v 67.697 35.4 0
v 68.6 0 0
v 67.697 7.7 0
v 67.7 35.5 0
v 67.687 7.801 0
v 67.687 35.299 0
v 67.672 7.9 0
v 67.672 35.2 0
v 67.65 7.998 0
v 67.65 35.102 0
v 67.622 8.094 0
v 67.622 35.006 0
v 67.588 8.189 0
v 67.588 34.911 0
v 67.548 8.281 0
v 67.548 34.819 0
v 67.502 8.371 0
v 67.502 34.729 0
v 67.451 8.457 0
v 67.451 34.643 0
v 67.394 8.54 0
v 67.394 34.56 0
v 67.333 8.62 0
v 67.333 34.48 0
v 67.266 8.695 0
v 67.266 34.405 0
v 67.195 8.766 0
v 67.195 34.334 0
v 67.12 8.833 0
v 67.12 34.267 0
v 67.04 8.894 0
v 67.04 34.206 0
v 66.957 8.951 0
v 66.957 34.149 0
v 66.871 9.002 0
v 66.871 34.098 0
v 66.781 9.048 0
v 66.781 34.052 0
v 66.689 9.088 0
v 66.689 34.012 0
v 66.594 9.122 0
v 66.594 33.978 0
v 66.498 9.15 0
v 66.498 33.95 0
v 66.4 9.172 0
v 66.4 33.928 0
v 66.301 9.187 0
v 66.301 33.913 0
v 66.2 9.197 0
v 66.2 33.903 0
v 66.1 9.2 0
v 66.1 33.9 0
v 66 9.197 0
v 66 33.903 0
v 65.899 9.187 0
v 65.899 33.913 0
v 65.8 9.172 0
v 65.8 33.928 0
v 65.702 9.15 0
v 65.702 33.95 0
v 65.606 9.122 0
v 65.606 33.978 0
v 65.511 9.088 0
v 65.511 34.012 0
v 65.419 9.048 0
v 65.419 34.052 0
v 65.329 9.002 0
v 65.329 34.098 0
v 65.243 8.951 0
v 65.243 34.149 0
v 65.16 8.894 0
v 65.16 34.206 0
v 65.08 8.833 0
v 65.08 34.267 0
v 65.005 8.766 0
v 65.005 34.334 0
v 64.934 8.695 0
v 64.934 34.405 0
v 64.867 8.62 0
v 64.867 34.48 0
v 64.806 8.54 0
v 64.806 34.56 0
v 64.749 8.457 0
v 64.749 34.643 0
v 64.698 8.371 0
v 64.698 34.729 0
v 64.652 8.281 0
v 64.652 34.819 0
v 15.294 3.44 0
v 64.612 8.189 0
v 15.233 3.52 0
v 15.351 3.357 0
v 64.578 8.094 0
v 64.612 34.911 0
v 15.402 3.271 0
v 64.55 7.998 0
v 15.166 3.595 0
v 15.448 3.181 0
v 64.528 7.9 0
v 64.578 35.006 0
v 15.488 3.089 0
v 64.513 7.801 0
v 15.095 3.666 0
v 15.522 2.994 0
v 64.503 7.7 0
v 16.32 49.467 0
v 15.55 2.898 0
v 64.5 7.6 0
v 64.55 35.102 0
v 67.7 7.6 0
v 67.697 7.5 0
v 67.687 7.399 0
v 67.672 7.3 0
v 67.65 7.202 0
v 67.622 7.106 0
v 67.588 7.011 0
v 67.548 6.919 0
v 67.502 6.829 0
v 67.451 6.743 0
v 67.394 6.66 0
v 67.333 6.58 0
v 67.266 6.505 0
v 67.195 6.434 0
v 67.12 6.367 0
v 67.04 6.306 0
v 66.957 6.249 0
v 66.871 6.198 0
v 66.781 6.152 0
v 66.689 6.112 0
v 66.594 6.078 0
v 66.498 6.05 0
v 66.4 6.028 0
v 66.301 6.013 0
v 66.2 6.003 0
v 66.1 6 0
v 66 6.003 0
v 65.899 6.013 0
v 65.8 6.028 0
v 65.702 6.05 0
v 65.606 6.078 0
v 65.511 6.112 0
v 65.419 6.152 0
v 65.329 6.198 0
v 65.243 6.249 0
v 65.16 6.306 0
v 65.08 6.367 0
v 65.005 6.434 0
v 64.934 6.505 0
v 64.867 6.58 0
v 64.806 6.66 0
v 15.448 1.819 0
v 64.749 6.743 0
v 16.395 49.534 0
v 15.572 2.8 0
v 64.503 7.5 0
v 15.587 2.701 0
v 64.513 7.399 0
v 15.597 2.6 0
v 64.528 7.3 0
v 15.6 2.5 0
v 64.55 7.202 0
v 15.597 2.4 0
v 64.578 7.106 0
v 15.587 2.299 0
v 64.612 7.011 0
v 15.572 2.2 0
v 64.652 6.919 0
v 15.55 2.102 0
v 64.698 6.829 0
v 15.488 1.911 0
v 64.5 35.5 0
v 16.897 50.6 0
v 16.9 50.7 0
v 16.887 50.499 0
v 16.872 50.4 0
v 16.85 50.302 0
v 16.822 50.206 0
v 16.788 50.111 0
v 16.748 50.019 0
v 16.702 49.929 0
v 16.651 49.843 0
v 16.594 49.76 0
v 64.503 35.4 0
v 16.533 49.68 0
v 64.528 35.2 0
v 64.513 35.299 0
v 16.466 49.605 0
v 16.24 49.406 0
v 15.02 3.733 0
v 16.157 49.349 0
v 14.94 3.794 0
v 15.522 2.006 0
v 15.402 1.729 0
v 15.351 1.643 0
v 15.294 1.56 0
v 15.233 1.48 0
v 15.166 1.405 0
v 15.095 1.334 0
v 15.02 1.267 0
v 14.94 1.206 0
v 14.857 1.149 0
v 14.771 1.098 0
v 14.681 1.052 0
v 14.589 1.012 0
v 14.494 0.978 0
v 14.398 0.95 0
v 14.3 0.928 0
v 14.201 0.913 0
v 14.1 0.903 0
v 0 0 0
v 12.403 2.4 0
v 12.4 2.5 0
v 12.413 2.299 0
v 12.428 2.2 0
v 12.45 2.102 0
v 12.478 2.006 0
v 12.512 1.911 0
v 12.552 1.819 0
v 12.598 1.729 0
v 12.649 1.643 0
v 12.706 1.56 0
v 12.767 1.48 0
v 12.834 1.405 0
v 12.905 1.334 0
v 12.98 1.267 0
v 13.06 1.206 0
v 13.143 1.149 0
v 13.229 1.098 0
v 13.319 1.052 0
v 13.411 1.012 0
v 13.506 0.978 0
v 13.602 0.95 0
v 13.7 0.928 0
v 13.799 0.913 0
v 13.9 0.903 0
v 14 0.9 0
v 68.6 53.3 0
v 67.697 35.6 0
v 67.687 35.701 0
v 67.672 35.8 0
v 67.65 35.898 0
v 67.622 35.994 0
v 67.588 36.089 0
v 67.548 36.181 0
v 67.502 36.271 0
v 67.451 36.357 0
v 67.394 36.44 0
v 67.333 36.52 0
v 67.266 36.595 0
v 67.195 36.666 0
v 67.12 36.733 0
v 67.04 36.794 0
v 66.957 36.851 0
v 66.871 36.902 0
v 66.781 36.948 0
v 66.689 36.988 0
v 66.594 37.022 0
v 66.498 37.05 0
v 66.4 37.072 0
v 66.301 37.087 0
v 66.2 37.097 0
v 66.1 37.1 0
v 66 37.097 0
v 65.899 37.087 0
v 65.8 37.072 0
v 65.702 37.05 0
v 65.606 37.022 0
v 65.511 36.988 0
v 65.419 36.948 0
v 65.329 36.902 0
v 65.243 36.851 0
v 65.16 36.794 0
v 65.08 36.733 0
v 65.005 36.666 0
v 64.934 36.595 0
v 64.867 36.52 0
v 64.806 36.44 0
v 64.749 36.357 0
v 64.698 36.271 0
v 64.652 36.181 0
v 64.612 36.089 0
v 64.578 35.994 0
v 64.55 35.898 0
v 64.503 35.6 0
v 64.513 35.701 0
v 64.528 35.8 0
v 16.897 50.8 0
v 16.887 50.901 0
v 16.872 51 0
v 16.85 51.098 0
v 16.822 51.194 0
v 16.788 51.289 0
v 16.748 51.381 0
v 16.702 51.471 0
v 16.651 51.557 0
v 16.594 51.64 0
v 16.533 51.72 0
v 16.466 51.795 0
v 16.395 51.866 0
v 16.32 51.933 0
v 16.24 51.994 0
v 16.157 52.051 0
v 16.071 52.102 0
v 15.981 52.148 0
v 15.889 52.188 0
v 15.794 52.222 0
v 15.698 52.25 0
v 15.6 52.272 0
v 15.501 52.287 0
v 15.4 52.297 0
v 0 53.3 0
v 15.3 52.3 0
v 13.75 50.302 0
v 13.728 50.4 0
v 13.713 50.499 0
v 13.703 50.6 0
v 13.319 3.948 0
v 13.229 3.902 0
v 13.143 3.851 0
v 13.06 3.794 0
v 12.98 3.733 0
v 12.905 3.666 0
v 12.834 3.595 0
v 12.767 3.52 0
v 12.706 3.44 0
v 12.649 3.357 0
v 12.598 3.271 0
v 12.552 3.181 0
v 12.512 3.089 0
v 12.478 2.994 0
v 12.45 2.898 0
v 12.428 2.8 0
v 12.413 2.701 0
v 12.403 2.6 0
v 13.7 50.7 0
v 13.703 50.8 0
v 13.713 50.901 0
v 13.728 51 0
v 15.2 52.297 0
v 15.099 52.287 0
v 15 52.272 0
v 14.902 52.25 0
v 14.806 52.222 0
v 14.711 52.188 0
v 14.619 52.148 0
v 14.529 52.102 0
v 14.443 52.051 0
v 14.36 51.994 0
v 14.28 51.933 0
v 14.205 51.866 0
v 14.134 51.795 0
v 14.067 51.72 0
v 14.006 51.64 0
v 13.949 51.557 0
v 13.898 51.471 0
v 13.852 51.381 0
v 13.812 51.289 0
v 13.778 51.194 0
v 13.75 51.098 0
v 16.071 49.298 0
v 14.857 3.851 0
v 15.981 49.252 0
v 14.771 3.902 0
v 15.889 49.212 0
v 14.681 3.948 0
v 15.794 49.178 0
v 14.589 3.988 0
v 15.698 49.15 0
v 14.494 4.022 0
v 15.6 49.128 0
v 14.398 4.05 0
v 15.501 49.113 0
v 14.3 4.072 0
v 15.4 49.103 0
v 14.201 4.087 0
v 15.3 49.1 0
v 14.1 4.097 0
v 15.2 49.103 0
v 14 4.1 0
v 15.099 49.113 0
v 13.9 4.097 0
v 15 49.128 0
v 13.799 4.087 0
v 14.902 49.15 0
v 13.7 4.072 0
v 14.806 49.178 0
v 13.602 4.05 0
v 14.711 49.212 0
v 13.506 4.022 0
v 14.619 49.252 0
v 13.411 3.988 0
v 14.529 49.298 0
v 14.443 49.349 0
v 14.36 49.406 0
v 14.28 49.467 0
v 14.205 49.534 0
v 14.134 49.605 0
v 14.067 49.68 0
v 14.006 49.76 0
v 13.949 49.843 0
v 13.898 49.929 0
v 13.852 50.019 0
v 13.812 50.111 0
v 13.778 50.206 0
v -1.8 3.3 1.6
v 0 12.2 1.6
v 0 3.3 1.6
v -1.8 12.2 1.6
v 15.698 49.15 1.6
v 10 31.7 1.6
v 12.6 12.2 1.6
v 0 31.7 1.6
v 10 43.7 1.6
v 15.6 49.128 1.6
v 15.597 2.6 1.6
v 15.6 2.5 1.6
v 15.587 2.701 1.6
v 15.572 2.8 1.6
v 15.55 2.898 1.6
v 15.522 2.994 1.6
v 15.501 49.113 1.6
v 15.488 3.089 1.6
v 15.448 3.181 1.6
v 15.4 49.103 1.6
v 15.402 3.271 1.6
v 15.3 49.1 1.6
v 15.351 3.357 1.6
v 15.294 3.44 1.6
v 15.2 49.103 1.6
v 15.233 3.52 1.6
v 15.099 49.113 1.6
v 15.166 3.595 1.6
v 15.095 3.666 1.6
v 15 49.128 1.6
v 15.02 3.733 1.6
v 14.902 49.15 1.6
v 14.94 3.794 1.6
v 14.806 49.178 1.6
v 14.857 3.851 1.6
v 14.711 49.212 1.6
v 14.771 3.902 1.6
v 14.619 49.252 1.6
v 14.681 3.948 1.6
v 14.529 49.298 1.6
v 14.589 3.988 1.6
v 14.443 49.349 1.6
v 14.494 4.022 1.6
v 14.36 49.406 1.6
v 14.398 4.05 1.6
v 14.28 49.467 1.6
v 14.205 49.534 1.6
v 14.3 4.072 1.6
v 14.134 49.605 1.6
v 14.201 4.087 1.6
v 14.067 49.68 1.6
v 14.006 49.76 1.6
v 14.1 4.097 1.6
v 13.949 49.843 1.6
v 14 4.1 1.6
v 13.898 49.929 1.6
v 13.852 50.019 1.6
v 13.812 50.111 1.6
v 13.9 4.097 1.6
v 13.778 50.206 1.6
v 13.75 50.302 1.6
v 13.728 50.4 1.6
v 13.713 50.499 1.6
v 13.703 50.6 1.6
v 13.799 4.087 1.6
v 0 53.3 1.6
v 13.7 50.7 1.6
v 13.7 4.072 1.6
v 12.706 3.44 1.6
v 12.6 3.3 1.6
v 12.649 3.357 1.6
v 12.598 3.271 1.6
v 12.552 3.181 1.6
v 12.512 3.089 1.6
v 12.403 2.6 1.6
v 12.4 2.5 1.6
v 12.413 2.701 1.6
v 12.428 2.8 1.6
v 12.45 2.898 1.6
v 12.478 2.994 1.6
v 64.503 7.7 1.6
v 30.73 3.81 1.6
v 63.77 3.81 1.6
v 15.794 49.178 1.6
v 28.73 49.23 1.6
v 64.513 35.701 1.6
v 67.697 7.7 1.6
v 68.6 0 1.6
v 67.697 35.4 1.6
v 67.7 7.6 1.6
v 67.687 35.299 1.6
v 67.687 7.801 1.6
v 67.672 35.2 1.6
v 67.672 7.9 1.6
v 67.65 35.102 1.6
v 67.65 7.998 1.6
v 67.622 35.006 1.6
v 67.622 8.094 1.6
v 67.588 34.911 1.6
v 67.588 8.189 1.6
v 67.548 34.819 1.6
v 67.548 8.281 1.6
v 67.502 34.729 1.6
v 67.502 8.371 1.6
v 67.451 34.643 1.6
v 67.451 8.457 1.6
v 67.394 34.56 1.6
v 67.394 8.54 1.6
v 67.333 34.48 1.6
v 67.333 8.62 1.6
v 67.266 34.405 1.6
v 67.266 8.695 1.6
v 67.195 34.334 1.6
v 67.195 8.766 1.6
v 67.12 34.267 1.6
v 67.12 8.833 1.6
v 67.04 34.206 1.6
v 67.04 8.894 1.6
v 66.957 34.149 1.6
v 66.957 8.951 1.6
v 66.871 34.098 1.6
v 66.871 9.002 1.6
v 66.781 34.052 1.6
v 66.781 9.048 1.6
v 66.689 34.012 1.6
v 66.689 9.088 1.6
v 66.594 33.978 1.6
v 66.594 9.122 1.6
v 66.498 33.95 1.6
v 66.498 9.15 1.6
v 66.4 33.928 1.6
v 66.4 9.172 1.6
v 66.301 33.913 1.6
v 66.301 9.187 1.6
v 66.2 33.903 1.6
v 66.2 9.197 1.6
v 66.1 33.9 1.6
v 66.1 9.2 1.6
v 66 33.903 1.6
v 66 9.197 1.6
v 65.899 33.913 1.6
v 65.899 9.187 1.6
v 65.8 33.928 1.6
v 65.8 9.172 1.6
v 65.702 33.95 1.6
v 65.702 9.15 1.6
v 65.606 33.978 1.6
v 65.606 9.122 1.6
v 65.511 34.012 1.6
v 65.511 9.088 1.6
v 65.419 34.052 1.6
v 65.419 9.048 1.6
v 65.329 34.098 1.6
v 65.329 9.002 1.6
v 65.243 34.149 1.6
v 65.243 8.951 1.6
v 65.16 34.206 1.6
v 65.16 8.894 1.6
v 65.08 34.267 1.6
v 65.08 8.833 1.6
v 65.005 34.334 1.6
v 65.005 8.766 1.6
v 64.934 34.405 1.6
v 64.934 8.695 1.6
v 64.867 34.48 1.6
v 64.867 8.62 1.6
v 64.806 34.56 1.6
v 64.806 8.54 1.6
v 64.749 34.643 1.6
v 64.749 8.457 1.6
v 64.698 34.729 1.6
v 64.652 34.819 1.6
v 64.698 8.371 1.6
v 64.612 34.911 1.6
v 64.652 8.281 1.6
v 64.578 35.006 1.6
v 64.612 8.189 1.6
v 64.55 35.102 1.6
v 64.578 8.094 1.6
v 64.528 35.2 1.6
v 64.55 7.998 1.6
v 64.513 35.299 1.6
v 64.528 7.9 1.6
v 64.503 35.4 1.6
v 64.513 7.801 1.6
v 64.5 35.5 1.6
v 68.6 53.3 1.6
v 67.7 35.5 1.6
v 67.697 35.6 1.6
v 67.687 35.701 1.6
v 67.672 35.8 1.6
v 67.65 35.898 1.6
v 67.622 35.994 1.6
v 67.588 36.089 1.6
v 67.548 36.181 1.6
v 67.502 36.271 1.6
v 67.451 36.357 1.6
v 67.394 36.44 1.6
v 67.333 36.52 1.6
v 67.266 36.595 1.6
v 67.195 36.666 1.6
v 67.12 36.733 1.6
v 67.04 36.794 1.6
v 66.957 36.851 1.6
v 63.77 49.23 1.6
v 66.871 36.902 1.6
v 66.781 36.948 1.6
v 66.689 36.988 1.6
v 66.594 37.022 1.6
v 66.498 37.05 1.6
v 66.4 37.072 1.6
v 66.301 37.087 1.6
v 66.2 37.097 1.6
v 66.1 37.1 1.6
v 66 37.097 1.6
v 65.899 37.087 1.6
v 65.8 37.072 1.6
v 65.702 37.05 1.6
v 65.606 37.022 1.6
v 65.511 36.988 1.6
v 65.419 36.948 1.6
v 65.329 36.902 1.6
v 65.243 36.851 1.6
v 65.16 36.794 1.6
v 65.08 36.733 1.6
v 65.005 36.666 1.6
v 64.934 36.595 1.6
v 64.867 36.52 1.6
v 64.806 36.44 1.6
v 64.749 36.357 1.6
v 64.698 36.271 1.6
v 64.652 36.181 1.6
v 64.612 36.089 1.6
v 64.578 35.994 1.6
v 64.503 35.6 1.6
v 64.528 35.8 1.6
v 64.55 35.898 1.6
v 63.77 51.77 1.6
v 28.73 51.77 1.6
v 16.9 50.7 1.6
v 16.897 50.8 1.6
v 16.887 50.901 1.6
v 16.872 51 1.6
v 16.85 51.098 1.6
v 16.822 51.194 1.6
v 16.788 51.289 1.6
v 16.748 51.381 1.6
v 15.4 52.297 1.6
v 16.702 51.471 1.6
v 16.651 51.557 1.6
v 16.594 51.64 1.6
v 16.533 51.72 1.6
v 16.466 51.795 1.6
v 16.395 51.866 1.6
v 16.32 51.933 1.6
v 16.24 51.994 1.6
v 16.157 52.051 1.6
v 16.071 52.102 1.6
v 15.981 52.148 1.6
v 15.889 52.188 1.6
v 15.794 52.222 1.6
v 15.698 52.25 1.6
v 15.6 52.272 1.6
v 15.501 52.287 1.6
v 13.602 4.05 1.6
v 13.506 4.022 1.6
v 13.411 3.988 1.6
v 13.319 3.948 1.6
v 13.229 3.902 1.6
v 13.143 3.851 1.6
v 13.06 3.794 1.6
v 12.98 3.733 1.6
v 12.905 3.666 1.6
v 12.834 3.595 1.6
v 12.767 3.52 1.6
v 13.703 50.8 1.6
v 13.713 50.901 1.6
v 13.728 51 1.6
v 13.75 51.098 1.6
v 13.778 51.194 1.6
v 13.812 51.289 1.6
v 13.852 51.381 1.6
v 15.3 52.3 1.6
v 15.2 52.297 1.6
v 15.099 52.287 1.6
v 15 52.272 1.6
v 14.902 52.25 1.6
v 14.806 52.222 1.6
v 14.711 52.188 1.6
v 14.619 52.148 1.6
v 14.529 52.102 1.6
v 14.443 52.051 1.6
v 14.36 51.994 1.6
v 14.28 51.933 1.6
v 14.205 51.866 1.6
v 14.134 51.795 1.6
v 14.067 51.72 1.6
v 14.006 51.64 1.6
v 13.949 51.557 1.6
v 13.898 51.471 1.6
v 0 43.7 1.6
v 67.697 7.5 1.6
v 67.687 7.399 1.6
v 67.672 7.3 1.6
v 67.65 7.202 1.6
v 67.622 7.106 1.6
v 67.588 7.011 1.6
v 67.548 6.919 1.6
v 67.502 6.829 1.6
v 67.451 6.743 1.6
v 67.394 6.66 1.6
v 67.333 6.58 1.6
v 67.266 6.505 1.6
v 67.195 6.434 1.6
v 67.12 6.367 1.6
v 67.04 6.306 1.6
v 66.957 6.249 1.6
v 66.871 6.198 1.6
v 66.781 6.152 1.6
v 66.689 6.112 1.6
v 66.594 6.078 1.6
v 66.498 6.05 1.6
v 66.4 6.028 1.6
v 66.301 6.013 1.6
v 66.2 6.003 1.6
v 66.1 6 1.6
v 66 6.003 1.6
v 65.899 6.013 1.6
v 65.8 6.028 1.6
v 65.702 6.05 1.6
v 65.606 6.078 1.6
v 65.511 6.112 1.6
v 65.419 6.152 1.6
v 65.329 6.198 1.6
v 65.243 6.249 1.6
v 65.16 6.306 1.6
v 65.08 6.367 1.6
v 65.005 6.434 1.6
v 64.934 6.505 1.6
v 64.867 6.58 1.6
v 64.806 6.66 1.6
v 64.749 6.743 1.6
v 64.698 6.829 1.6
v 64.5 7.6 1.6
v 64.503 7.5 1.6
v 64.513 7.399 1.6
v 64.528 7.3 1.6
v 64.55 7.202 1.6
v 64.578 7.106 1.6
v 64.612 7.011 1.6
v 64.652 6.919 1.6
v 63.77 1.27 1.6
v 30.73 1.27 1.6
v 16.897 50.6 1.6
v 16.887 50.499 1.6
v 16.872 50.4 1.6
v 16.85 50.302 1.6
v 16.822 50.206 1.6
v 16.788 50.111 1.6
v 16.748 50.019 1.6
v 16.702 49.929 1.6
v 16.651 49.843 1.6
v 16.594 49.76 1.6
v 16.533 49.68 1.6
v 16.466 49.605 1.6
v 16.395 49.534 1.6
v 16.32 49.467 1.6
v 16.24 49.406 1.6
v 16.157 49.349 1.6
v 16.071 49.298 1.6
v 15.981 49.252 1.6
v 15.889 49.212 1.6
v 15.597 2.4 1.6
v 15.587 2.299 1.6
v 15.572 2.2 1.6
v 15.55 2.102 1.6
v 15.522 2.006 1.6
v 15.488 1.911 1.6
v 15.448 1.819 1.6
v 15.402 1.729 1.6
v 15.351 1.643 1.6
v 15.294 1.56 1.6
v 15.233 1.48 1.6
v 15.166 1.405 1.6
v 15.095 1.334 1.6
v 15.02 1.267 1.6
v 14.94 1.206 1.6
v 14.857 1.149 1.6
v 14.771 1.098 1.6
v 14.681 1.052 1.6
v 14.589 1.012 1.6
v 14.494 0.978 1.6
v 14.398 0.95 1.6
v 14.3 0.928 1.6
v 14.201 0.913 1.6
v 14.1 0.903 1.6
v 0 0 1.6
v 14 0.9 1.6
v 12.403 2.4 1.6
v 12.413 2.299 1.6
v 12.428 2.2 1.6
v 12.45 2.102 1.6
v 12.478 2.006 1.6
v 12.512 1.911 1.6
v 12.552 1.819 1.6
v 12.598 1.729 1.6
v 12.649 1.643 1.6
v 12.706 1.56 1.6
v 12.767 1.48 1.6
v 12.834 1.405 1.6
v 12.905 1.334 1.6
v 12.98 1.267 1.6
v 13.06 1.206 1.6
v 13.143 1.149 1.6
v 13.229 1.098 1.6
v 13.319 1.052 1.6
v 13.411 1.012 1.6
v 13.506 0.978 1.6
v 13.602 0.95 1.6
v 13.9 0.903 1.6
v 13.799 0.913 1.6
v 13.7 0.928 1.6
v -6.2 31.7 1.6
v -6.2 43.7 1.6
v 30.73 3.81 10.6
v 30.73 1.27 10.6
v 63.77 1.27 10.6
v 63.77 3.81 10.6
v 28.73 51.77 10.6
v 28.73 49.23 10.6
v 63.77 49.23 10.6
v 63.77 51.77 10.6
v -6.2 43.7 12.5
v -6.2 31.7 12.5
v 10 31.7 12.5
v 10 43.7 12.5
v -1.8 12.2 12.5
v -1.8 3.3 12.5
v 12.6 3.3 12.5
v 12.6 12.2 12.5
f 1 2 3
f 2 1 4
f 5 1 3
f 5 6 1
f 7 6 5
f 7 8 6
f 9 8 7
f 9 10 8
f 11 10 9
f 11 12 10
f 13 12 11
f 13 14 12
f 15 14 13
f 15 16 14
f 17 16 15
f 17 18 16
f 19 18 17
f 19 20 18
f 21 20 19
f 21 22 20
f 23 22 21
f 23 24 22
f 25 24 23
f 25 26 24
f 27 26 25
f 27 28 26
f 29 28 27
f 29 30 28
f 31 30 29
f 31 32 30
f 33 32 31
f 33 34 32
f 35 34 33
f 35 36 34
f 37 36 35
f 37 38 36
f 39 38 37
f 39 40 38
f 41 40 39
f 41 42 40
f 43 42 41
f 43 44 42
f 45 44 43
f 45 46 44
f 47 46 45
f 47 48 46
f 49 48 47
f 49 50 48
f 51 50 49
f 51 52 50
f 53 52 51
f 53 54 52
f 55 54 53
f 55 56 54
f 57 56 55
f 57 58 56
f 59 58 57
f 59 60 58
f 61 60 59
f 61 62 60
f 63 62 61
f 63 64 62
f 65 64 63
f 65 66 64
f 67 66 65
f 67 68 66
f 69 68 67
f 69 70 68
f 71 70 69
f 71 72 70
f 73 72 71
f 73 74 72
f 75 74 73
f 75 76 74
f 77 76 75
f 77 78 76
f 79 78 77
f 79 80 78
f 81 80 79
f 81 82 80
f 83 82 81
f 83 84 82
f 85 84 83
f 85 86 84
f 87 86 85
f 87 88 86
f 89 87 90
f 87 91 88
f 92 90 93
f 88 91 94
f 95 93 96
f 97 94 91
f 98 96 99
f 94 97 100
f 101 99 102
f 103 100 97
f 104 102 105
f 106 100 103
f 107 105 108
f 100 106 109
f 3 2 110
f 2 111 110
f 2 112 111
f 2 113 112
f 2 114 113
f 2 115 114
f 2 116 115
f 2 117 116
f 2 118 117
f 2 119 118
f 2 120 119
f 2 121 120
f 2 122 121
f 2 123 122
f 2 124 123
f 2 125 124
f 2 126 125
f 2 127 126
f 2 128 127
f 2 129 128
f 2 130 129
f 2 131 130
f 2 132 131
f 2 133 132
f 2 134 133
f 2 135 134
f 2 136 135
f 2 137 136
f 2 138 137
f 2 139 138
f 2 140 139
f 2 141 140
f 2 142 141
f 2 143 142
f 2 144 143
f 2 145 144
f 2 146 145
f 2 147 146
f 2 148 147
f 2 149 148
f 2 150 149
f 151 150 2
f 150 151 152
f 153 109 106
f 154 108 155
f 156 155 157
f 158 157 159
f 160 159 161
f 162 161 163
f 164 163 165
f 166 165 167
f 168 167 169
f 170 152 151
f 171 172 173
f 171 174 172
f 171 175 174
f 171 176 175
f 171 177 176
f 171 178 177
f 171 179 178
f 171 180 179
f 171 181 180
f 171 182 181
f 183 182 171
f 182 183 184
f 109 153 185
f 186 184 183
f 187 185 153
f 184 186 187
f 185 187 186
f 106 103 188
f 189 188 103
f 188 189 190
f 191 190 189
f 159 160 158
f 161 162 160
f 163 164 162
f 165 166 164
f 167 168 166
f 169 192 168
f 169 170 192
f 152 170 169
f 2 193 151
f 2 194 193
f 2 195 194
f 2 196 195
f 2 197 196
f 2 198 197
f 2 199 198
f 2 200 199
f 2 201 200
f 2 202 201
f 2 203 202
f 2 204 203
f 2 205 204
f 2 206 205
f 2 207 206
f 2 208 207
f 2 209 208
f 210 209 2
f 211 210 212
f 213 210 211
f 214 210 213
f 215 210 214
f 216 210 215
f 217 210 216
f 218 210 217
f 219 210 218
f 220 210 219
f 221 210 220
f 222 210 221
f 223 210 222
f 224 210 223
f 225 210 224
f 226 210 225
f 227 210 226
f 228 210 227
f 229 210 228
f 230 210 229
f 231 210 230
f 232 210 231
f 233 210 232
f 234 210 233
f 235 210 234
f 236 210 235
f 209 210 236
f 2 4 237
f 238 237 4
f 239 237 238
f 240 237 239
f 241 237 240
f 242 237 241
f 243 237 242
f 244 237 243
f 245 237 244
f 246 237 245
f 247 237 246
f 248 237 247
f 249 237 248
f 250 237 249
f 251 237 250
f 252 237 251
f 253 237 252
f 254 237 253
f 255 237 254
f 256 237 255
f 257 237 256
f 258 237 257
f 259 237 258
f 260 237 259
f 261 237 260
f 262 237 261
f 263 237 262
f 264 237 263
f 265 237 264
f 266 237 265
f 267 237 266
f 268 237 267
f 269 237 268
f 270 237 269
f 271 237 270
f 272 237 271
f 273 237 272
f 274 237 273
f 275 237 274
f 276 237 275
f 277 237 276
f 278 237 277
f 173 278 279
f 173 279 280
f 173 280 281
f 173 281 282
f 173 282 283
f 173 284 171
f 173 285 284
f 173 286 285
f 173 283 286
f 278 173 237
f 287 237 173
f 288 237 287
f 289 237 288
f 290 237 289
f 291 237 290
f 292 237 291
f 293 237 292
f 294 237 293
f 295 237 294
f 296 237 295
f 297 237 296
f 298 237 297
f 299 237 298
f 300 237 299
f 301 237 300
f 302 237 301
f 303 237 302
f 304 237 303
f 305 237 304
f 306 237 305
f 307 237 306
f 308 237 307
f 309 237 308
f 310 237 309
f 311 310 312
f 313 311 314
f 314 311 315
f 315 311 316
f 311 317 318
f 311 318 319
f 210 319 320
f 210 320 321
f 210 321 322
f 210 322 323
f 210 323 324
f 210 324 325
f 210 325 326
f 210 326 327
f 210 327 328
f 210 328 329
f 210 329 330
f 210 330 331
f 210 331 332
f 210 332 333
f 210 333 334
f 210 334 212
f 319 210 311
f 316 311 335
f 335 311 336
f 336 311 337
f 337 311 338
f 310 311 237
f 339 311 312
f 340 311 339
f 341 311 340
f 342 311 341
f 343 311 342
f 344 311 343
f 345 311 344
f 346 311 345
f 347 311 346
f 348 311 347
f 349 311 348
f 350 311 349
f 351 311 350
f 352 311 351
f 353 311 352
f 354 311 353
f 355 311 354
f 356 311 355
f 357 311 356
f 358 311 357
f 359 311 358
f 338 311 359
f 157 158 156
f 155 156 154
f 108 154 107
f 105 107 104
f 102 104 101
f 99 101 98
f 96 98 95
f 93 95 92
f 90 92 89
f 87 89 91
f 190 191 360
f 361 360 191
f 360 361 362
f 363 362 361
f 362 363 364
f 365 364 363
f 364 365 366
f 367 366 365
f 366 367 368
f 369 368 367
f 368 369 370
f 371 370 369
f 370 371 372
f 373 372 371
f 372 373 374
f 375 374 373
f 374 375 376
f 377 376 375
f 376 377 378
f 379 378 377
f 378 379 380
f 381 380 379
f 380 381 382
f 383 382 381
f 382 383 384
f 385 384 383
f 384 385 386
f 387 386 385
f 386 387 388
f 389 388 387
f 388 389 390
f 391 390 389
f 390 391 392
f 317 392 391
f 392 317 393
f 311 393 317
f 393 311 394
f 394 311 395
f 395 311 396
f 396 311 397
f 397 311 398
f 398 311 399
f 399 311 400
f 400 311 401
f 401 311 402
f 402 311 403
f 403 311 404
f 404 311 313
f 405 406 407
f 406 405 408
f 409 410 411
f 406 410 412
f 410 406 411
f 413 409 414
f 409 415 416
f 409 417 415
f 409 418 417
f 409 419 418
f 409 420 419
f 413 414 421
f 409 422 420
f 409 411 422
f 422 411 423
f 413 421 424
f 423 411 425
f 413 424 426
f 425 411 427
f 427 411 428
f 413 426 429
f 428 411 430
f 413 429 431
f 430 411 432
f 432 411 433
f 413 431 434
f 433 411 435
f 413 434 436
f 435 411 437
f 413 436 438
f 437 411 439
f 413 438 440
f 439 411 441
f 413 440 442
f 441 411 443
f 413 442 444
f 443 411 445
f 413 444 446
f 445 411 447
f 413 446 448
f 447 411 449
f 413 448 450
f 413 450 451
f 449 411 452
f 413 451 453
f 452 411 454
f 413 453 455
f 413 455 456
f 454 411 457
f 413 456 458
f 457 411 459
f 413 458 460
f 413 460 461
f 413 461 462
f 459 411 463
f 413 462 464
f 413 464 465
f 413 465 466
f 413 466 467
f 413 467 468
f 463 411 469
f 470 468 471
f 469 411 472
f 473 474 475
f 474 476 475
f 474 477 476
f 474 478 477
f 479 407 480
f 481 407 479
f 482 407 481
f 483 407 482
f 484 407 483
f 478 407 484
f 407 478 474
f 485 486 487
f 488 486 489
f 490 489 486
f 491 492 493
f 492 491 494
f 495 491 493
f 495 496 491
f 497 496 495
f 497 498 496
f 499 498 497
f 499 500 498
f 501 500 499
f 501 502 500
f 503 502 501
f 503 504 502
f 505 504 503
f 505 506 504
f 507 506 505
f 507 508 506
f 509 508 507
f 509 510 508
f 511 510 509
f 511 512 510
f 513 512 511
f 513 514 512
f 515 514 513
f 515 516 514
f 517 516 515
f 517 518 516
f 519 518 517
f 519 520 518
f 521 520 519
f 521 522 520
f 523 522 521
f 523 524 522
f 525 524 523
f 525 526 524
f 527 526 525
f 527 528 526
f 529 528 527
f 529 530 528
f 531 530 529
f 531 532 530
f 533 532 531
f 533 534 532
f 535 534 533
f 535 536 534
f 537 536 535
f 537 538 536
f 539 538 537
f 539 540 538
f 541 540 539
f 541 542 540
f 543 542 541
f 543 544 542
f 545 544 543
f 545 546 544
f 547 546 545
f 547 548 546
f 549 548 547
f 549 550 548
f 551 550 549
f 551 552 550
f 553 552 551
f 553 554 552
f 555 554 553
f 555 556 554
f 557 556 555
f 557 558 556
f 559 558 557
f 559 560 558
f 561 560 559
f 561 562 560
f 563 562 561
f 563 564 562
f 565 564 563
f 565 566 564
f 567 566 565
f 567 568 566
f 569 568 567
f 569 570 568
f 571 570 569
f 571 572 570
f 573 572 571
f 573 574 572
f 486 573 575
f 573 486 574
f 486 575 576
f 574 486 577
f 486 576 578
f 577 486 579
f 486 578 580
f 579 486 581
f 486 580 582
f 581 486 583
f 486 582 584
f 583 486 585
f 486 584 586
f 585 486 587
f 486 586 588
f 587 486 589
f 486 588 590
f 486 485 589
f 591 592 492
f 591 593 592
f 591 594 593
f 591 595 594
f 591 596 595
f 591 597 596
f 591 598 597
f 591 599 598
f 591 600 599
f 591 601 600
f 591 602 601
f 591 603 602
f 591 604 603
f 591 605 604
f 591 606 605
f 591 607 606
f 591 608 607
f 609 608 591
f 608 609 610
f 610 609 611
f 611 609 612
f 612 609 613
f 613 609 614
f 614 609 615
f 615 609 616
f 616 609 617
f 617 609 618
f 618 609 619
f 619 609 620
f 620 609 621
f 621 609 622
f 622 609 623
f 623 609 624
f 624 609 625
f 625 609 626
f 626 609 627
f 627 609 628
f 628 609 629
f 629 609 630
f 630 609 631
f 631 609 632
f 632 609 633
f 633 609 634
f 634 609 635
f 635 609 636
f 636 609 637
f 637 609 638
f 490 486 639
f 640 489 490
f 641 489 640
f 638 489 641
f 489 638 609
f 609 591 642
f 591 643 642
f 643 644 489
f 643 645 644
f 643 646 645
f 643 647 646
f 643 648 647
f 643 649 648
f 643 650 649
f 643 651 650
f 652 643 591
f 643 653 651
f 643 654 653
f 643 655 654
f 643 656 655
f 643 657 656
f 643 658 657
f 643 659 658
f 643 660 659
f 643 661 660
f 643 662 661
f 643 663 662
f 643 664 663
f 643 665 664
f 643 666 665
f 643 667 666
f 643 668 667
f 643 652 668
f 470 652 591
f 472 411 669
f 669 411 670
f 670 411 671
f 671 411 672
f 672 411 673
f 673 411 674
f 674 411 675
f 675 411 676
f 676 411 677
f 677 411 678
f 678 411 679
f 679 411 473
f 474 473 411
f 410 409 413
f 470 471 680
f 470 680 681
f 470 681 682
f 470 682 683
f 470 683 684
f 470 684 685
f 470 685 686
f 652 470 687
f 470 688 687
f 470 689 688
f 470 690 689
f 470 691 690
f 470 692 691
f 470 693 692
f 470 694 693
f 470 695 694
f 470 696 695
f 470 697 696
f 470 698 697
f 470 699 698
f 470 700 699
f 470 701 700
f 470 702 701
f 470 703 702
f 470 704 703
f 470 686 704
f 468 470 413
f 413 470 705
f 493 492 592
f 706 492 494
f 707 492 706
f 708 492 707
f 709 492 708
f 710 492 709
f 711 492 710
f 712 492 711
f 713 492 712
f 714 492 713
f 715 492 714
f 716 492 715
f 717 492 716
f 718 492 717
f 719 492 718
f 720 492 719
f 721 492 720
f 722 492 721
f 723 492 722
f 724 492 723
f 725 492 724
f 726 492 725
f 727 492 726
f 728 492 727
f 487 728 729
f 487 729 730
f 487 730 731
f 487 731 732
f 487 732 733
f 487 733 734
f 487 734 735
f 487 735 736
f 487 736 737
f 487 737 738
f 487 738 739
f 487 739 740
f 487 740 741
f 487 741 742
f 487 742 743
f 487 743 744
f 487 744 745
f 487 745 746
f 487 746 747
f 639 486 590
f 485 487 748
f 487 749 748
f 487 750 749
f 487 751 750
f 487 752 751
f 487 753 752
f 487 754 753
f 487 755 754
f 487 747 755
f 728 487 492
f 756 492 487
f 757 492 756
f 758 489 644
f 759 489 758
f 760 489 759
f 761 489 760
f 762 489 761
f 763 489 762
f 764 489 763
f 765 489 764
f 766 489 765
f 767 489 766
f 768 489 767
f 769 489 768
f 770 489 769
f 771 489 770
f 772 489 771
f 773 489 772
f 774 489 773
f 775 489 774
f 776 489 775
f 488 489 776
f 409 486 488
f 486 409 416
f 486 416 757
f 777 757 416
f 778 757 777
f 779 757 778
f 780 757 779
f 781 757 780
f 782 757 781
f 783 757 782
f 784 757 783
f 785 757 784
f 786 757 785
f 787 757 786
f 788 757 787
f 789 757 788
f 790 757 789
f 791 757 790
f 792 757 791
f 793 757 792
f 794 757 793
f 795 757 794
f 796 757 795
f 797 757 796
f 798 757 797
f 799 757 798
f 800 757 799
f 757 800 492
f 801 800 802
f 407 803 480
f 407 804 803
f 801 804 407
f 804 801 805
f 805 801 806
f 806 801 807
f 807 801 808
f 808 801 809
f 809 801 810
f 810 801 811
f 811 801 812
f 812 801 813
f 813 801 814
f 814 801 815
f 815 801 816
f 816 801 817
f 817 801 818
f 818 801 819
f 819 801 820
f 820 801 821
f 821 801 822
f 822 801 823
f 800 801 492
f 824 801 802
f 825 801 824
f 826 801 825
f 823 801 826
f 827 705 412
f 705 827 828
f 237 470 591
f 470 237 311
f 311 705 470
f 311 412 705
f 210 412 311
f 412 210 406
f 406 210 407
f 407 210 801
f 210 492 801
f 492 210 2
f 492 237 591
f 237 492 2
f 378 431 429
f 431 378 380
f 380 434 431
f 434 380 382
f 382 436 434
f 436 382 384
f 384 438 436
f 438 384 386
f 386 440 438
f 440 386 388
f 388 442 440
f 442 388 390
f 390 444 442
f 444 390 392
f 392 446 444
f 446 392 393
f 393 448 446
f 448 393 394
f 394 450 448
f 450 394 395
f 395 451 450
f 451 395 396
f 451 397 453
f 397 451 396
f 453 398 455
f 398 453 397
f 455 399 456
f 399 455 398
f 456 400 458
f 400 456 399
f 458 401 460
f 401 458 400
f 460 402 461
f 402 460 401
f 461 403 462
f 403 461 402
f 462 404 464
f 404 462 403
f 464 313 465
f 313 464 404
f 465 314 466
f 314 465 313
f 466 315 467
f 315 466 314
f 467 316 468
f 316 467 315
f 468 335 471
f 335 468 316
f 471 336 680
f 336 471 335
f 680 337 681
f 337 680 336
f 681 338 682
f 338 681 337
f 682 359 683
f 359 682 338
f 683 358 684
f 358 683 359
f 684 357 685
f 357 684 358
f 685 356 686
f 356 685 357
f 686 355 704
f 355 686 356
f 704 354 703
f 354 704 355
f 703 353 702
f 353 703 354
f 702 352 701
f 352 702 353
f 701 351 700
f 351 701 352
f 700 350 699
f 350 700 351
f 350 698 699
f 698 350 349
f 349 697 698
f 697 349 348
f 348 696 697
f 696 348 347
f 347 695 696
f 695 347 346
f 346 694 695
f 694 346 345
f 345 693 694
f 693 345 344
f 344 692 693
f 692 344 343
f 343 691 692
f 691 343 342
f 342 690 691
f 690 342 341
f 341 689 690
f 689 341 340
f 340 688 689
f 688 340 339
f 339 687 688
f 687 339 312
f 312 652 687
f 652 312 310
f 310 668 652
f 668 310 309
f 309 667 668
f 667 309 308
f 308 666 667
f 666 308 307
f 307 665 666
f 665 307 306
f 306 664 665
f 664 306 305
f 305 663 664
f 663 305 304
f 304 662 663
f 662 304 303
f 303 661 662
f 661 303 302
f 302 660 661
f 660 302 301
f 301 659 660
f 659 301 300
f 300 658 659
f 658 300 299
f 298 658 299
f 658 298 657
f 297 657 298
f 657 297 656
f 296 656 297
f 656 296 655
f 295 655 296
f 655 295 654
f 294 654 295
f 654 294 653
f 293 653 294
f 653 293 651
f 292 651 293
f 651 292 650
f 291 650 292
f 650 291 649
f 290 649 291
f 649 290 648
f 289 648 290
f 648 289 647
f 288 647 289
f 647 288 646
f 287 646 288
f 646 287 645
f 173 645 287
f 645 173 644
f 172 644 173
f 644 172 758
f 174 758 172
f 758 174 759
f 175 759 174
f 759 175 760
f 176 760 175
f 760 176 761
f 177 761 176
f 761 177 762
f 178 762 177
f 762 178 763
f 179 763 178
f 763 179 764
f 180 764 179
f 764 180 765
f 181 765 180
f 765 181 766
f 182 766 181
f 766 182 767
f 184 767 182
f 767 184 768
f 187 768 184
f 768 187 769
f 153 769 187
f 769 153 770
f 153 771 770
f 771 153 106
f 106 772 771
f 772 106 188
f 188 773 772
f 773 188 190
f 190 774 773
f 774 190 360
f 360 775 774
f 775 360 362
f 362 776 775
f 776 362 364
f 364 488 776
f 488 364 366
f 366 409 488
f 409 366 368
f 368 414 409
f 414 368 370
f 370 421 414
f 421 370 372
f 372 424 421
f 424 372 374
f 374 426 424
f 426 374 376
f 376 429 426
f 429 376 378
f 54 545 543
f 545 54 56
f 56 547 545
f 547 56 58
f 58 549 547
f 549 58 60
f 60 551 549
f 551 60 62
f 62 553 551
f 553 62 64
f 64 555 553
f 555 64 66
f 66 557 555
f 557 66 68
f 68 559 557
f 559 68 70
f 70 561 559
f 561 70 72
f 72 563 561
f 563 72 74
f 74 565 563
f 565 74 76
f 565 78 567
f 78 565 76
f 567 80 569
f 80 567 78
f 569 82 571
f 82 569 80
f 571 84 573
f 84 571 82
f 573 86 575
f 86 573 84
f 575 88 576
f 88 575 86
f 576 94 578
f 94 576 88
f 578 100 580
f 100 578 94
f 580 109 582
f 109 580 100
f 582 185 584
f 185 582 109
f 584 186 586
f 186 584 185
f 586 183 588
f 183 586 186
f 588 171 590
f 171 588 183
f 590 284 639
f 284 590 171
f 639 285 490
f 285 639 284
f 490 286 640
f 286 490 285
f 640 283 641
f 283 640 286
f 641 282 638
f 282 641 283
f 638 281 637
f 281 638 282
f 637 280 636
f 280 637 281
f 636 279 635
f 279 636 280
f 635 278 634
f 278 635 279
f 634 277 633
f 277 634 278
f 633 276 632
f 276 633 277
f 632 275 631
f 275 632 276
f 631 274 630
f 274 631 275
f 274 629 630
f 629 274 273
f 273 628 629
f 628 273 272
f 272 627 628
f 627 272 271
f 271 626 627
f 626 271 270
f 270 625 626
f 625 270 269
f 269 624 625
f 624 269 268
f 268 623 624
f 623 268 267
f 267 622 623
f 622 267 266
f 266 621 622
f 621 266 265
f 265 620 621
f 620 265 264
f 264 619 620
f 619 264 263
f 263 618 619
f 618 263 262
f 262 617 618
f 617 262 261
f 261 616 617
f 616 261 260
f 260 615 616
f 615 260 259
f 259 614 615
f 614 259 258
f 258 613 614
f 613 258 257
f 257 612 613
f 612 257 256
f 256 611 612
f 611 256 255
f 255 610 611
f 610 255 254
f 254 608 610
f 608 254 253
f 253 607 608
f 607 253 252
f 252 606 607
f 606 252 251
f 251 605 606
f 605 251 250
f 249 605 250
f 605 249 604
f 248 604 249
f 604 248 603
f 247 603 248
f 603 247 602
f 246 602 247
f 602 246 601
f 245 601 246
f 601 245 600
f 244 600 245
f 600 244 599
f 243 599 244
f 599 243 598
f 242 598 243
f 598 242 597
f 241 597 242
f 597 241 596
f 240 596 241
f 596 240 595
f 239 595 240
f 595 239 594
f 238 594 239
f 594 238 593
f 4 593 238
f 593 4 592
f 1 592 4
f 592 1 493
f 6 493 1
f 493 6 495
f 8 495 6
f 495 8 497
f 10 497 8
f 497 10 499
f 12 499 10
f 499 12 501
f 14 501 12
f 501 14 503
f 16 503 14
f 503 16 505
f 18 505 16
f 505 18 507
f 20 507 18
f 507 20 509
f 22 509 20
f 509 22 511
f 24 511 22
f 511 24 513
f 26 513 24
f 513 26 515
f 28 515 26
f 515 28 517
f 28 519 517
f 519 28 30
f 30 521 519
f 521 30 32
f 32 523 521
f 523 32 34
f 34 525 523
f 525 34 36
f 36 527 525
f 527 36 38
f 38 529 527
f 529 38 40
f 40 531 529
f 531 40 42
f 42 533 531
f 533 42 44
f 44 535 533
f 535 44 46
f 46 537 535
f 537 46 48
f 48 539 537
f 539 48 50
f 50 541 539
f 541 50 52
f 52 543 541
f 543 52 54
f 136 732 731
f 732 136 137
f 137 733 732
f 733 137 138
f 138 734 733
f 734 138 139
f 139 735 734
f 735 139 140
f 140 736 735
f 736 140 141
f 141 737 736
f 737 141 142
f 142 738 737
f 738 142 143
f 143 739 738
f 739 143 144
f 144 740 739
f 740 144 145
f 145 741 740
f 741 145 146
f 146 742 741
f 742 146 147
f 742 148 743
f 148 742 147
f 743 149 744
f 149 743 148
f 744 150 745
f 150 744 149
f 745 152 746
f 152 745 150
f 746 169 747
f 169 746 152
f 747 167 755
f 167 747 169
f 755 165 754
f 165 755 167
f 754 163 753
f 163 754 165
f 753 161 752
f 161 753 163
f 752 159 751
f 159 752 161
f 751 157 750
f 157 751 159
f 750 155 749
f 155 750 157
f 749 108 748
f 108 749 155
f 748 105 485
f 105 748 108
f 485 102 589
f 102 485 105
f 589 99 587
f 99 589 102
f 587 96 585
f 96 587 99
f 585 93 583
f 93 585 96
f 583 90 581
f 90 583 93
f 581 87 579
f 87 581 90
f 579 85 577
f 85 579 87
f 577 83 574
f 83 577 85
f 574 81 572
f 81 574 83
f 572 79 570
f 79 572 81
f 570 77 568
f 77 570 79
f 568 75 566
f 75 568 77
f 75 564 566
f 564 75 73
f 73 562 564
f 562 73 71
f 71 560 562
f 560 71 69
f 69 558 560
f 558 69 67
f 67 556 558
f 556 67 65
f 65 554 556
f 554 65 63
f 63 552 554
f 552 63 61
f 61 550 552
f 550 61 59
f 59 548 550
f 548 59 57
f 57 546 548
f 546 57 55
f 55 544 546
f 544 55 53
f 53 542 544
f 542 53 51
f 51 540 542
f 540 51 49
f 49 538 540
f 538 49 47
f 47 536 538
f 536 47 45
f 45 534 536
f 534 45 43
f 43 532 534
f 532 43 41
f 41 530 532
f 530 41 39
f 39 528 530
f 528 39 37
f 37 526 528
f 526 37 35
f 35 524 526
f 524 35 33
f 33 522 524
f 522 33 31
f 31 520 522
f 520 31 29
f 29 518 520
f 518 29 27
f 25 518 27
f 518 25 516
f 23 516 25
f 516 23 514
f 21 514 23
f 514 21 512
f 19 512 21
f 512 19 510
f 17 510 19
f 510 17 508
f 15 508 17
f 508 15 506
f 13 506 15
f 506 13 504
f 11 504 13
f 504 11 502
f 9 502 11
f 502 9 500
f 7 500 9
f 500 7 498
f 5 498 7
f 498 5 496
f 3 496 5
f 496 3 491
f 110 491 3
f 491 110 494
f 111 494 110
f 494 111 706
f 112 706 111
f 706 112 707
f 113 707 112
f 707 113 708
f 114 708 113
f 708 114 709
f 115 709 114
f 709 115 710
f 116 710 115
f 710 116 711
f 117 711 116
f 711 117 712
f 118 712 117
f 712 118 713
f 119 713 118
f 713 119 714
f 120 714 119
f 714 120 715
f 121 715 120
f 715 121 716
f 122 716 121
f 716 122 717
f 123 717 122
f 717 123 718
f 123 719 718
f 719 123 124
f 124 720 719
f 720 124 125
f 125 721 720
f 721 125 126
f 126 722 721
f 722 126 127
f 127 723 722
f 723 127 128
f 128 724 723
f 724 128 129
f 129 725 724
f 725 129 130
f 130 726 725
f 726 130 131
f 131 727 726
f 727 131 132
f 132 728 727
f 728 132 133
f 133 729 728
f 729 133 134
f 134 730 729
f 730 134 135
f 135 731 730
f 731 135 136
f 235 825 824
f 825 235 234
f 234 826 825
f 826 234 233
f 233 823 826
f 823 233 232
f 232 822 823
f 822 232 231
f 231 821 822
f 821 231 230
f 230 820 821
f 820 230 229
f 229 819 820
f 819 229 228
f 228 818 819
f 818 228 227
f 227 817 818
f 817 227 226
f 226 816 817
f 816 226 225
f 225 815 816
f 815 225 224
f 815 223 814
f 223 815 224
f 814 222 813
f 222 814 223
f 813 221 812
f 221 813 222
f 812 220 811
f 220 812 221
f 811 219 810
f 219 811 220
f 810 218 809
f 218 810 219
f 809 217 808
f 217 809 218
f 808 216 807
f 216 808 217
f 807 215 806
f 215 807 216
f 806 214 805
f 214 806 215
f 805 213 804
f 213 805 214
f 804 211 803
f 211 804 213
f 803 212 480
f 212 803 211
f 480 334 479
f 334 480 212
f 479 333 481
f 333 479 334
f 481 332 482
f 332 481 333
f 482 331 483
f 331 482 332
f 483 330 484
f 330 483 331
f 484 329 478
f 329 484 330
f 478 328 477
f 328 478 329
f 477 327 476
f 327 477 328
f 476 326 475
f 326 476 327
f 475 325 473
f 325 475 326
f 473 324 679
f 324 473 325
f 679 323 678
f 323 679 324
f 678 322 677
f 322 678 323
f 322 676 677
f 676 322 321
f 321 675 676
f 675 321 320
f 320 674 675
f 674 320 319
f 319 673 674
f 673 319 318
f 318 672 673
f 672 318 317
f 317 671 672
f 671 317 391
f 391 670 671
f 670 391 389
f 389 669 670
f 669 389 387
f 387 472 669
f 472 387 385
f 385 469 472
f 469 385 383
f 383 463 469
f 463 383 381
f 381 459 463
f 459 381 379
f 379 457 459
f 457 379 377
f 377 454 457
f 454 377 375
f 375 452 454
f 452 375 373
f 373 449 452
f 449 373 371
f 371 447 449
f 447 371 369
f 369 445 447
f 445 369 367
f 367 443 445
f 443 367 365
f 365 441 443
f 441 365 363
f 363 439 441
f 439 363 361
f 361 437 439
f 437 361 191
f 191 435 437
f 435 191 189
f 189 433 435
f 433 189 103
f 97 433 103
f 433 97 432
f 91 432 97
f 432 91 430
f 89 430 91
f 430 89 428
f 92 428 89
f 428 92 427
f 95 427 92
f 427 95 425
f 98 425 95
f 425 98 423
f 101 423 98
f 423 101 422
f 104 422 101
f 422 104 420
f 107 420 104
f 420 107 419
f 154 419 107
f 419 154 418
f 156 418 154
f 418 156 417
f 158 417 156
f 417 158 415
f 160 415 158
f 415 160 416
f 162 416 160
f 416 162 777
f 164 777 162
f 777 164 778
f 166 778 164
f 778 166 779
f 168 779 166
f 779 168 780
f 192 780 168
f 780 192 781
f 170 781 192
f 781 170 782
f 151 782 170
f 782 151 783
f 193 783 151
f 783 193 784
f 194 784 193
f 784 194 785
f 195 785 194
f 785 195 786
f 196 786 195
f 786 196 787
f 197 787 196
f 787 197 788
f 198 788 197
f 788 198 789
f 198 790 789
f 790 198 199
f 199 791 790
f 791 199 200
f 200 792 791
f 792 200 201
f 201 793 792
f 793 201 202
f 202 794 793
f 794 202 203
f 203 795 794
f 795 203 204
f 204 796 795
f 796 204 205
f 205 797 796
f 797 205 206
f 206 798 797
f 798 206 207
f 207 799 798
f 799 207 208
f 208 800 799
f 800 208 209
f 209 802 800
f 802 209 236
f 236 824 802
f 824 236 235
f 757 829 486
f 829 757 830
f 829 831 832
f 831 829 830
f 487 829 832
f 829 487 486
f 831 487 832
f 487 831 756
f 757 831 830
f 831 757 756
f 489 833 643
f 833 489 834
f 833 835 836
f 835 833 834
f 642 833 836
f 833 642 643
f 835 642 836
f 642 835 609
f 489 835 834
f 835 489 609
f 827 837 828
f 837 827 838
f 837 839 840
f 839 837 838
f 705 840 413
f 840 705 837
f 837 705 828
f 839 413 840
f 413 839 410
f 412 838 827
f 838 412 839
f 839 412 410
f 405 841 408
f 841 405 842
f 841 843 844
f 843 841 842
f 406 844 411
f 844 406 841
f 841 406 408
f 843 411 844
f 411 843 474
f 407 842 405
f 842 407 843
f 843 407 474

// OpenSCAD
// Board
ard_w = 53.3;
ard_l = 68.6;
ard_hole_d = 3.2;
ard_hole1_x = 14;
ard_hole1_y = 2.5;
ard_hole2_x = 15.3;
ard_hole2_y = 50.7;
ard_hole3_x = 66.1;
ard_hole3_y = 7.6;
ard_hole4_x = 66.1;
ard_hole4_y = 35.5;
ard_board_t = 1.6;

// Headers
row1_y = 2.54;
row1_x1 = 32;
row1_x2 = 62.5;
row2_y = 50.5;
row2_x1 = 30;
row2_x2 = 62.5;
pin_w = 2.54;
pin_h = 9;

// Jacks
jack1_w = 12;
jack1_l = 16.2;
jack1_h = 10.9;
jack1_x = -6.2;
jack1_y = 31.7;
jack2_w = 8.9;
jack2_l = 14.4;
jack2_h = 10.9;
jack2_x = -1.8;
jack2_y = 3.3;

// Case
wall_t = 2.4;
clearance = 1;
radius = 6;
bot_clearance = 2;
inner_height = 14.1;
lip = wall_t/2;

module arduino() {
    // Board
    color([0, 0.8, 0.4])
    linear_extrude(ard_board_t){
        difference() {
            square([ard_l, ard_w]);
            translate([ard_hole1_x, ard_hole1_y, 0])
            circle(d=ard_hole_d, $fn=100);
            translate([ard_hole2_x, ard_hole2_y, 0])
            circle(d=ard_hole_d, $fn=100);
            translate([ard_hole3_x, ard_hole3_y, 0])
            circle(d=ard_hole_d, $fn=100);
            translate([ard_hole4_x, ard_hole4_y, 0])
            circle(d=ard_hole_d, $fn=100);
        }
    }
    // Headers
    color([0.2, 0.2, 0.2])
    translate([row1_x1-pin_w/2, row1_y-pin_w/2, ard_board_t])
    linear_extrude(pin_h) {
        square([row1_x2-row1_x1+pin_w, pin_w]);
    }
    color([0.2, 0.2, 0.2])
    translate([row2_x1-pin_w/2, row2_y-pin_w/2, ard_board_t])
    linear_extrude(pin_h) {
        square([row2_x2-row2_x1+pin_w, pin_w]);
    }
    // Jacks
    color([0.6, 0.6, 0.6])
    translate([jack1_x, jack1_y, ard_board_t])
    linear_extrude(jack1_h) {
        square([jack1_l, jack1_w]);
    }
    color([0.2, 0.2, 0.2])
    translate([jack2_x, jack2_y, ard_board_t])
    linear_extrude(jack2_h) {
        square([jack2_l, jack2_w]);
    }
}

module case_bottom() {
    difference() {
        union(){
            translate([-wall_t-clearance+radius, -wall_t-clearance])
            difference() {
                minkowski() {
                    linear_extrude((inner_height/2+wall_t)/2+bot_clearance) {
                        square([ard_l+2*clearance+2*wall_t-2*radius, ard_w+2*clearance+2*wall_t]);
                    }
                    cylinder(h=(inner_height/2+wall_t)/2, r=radius, $fn=100);
                }
                translate([0, 0, wall_t])
                minkowski() {
                    linear_extrude((inner_height/2+wall_t)/2+bot_clearance) {
                        square([ard_l+2*clearance-2*(radius-wall_t), ard_w+2*clearance+2*wall_t]);
                    }
                    cylinder(h=(inner_height/2+wall_t)/2, r=radius-wall_t, $fn=100);
                }
            }
            translate([ard_hole1_x, ard_hole1_y, wall_t])
            cylinder(bot_clearance+ard_board_t, ard_hole_d/2-clearance/2, ard_hole_d/2-clearance/2, $fn=100);
            translate([ard_hole1_x, ard_hole1_y, wall_t])
            cylinder(bot_clearance, ard_hole_d, ard_hole_d, $fn=100);
            translate([ard_hole2_x, ard_hole2_y, wall_t])
            cylinder(bot_clearance+ard_board_t, ard_hole_d/2-clearance/2, ard_hole_d/2-clearance/2, $fn=100);
            translate([ard_hole2_x, ard_hole2_y, wall_t])
            cylinder(bot_clearance, ard_hole_d, ard_hole_d, $fn=100);
            translate([ard_hole3_x, ard_hole3_y, wall_t])
            cylinder(bot_clearance+ard_board_t, ard_hole_d/2-clearance/2, ard_hole_d/2-clearance/2, $fn=100);
            translate([ard_hole3_x, ard_hole3_y, wall_t])
            cylinder(bot_clearance, ard_hole_d, ard_hole_d, $fn=100);
            translate([ard_hole4_x, ard_hole4_y, wall_t])
            cylinder(bot_clearance+ard_board_t, ard_hole_d/2-clearance/2, ard_hole_d/2-clearance/2, $fn=100);
            translate([ard_hole4_x, ard_hole4_y, wall_t])
            cylinder(bot_clearance, ard_hole_d, ard_hole_d, $fn=100);
        }
        translate([0, jack1_y-clearance, wall_t+bot_clearance+ard_board_t-clearance])
        rotate([0, -90, 0])
        linear_extrude(wall_t*2) {
            square([jack1_h+2*clearance, jack1_w+2*clearance]);
        }
        translate([0, jack2_y-clearance, wall_t+bot_clearance+ard_board_t-clearance])
        rotate([0, -90, 0])
        linear_extrude(wall_t*2) {
            square([jack2_h+2*clearance, jack2_w+2*clearance]);
        }
    }
    translate([0, 0, wall_t+bot_clearance])
    arduino();
}

arduino();
